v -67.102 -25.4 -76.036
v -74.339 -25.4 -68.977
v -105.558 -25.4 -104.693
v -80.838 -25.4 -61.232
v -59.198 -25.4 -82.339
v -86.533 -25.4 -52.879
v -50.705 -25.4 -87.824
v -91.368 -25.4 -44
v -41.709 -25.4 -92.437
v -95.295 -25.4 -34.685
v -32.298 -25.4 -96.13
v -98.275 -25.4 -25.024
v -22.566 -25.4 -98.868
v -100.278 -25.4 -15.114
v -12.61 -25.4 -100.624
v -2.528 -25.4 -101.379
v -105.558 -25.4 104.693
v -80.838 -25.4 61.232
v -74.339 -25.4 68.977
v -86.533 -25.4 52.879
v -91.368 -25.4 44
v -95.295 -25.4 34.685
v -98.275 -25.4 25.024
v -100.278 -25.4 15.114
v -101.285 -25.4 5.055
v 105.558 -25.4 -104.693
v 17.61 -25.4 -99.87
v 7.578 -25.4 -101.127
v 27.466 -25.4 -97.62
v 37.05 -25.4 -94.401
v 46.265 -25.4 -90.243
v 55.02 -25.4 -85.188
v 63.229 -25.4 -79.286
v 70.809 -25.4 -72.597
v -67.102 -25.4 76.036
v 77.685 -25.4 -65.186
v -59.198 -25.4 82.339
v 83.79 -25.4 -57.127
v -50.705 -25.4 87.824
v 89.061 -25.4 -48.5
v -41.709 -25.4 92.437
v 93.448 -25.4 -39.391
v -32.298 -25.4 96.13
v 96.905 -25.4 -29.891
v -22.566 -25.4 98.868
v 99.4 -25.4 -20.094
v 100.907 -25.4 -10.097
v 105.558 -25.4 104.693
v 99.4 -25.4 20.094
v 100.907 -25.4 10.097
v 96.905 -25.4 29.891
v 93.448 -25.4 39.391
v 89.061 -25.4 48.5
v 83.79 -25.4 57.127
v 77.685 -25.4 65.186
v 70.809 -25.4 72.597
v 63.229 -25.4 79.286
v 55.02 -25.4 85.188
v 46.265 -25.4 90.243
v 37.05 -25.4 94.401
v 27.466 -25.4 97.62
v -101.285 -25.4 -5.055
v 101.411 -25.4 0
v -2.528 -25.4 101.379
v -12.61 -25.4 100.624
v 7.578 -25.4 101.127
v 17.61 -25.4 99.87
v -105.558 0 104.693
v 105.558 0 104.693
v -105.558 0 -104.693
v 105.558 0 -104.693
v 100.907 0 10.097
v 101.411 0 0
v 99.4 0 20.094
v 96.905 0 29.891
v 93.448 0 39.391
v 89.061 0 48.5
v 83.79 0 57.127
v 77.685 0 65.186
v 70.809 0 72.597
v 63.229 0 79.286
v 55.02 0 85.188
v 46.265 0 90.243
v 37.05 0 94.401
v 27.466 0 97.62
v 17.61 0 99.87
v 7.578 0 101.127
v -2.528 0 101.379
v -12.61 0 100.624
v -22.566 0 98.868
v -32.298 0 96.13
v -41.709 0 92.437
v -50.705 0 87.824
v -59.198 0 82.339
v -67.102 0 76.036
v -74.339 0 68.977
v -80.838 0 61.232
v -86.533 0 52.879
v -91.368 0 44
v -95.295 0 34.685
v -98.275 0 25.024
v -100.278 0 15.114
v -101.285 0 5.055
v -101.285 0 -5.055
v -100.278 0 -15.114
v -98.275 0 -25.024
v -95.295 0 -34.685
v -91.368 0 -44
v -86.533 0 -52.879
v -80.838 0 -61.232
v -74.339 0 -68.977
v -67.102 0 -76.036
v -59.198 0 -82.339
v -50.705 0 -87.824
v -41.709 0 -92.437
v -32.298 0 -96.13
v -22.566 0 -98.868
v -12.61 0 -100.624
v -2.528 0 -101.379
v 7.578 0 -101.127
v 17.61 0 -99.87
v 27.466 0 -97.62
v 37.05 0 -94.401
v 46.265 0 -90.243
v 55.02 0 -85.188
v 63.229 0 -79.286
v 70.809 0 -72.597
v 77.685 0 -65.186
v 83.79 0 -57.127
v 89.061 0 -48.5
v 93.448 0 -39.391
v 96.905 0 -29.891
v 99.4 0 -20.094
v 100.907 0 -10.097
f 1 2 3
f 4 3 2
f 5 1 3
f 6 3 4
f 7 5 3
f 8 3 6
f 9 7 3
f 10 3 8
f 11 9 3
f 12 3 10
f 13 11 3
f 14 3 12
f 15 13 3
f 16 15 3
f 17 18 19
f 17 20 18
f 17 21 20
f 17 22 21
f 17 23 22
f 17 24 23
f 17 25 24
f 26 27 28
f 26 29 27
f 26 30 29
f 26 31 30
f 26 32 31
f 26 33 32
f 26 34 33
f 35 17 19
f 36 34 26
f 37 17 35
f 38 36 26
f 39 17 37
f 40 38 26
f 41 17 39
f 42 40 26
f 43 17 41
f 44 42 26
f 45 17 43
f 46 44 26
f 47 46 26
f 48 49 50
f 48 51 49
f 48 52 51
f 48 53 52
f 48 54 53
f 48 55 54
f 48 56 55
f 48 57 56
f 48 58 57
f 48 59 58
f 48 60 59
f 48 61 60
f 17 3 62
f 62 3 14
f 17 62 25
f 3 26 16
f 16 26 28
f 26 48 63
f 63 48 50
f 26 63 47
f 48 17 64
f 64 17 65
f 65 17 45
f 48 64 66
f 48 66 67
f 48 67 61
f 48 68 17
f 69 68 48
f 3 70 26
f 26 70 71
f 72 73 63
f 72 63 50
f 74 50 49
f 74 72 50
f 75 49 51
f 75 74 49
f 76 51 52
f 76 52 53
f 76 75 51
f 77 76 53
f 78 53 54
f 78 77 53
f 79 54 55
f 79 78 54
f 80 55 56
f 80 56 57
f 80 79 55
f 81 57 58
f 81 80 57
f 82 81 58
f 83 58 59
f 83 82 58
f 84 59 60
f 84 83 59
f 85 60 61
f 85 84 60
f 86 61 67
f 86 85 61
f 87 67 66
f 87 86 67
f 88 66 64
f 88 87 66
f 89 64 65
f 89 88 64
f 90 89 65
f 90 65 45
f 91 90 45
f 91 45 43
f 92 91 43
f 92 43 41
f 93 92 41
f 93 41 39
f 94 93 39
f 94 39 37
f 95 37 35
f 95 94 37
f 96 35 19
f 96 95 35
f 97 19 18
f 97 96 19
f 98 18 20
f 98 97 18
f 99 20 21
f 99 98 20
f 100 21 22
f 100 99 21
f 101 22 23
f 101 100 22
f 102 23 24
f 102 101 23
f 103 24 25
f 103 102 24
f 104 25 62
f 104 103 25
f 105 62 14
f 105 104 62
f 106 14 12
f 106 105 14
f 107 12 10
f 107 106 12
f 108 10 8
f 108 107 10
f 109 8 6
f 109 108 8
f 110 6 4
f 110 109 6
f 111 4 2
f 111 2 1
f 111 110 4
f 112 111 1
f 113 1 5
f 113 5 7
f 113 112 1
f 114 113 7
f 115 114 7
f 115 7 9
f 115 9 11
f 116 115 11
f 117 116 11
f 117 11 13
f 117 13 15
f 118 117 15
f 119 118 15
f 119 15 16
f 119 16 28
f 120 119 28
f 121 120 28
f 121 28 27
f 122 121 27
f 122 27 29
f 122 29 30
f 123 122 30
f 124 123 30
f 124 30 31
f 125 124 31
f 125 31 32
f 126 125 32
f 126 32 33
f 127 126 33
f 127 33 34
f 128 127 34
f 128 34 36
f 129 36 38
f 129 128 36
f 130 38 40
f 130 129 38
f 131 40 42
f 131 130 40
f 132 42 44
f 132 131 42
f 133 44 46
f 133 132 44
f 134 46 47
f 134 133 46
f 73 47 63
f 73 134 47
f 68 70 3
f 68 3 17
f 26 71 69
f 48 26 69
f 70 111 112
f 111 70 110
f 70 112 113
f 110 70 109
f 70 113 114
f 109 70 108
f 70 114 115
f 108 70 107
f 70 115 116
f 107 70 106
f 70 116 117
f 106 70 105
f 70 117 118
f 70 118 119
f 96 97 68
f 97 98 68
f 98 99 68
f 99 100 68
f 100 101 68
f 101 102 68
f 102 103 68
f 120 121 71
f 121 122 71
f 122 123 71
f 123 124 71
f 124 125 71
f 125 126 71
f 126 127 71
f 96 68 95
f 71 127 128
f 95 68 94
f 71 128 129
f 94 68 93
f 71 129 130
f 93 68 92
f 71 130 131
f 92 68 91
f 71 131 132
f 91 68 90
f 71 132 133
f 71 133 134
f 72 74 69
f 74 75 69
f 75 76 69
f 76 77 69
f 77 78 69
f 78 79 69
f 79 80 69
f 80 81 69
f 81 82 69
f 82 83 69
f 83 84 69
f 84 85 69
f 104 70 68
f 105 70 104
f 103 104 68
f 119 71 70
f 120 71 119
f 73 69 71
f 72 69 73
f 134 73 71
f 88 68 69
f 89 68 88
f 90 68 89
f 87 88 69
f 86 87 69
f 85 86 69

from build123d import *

# Parameters (mm, degrees)
F0_W     = 211.11551
F0_H     = 209.385068
F0_R     = 101.410764
F1_DEPTH = 25.4
F2_DEPTH = 25.4


with BuildPart() as f1:
    # F0 (on Front) → F1 (new body)
    with BuildSketch(Plane.XZ):
        Rectangle(F0_W, F0_H)
        Circle(F0_R, mode=Mode.SUBTRACT)
    extrude(amount=F1_DEPTH)

    # F0 (on Front) → F2 (join)
    with BuildSketch(Plane.XZ):
        Rectangle(F0_W, F0_H)
        Circle(F0_R, mode=Mode.SUBTRACT)
    extrude(amount=F2_DEPTH)


solid = f1.part
